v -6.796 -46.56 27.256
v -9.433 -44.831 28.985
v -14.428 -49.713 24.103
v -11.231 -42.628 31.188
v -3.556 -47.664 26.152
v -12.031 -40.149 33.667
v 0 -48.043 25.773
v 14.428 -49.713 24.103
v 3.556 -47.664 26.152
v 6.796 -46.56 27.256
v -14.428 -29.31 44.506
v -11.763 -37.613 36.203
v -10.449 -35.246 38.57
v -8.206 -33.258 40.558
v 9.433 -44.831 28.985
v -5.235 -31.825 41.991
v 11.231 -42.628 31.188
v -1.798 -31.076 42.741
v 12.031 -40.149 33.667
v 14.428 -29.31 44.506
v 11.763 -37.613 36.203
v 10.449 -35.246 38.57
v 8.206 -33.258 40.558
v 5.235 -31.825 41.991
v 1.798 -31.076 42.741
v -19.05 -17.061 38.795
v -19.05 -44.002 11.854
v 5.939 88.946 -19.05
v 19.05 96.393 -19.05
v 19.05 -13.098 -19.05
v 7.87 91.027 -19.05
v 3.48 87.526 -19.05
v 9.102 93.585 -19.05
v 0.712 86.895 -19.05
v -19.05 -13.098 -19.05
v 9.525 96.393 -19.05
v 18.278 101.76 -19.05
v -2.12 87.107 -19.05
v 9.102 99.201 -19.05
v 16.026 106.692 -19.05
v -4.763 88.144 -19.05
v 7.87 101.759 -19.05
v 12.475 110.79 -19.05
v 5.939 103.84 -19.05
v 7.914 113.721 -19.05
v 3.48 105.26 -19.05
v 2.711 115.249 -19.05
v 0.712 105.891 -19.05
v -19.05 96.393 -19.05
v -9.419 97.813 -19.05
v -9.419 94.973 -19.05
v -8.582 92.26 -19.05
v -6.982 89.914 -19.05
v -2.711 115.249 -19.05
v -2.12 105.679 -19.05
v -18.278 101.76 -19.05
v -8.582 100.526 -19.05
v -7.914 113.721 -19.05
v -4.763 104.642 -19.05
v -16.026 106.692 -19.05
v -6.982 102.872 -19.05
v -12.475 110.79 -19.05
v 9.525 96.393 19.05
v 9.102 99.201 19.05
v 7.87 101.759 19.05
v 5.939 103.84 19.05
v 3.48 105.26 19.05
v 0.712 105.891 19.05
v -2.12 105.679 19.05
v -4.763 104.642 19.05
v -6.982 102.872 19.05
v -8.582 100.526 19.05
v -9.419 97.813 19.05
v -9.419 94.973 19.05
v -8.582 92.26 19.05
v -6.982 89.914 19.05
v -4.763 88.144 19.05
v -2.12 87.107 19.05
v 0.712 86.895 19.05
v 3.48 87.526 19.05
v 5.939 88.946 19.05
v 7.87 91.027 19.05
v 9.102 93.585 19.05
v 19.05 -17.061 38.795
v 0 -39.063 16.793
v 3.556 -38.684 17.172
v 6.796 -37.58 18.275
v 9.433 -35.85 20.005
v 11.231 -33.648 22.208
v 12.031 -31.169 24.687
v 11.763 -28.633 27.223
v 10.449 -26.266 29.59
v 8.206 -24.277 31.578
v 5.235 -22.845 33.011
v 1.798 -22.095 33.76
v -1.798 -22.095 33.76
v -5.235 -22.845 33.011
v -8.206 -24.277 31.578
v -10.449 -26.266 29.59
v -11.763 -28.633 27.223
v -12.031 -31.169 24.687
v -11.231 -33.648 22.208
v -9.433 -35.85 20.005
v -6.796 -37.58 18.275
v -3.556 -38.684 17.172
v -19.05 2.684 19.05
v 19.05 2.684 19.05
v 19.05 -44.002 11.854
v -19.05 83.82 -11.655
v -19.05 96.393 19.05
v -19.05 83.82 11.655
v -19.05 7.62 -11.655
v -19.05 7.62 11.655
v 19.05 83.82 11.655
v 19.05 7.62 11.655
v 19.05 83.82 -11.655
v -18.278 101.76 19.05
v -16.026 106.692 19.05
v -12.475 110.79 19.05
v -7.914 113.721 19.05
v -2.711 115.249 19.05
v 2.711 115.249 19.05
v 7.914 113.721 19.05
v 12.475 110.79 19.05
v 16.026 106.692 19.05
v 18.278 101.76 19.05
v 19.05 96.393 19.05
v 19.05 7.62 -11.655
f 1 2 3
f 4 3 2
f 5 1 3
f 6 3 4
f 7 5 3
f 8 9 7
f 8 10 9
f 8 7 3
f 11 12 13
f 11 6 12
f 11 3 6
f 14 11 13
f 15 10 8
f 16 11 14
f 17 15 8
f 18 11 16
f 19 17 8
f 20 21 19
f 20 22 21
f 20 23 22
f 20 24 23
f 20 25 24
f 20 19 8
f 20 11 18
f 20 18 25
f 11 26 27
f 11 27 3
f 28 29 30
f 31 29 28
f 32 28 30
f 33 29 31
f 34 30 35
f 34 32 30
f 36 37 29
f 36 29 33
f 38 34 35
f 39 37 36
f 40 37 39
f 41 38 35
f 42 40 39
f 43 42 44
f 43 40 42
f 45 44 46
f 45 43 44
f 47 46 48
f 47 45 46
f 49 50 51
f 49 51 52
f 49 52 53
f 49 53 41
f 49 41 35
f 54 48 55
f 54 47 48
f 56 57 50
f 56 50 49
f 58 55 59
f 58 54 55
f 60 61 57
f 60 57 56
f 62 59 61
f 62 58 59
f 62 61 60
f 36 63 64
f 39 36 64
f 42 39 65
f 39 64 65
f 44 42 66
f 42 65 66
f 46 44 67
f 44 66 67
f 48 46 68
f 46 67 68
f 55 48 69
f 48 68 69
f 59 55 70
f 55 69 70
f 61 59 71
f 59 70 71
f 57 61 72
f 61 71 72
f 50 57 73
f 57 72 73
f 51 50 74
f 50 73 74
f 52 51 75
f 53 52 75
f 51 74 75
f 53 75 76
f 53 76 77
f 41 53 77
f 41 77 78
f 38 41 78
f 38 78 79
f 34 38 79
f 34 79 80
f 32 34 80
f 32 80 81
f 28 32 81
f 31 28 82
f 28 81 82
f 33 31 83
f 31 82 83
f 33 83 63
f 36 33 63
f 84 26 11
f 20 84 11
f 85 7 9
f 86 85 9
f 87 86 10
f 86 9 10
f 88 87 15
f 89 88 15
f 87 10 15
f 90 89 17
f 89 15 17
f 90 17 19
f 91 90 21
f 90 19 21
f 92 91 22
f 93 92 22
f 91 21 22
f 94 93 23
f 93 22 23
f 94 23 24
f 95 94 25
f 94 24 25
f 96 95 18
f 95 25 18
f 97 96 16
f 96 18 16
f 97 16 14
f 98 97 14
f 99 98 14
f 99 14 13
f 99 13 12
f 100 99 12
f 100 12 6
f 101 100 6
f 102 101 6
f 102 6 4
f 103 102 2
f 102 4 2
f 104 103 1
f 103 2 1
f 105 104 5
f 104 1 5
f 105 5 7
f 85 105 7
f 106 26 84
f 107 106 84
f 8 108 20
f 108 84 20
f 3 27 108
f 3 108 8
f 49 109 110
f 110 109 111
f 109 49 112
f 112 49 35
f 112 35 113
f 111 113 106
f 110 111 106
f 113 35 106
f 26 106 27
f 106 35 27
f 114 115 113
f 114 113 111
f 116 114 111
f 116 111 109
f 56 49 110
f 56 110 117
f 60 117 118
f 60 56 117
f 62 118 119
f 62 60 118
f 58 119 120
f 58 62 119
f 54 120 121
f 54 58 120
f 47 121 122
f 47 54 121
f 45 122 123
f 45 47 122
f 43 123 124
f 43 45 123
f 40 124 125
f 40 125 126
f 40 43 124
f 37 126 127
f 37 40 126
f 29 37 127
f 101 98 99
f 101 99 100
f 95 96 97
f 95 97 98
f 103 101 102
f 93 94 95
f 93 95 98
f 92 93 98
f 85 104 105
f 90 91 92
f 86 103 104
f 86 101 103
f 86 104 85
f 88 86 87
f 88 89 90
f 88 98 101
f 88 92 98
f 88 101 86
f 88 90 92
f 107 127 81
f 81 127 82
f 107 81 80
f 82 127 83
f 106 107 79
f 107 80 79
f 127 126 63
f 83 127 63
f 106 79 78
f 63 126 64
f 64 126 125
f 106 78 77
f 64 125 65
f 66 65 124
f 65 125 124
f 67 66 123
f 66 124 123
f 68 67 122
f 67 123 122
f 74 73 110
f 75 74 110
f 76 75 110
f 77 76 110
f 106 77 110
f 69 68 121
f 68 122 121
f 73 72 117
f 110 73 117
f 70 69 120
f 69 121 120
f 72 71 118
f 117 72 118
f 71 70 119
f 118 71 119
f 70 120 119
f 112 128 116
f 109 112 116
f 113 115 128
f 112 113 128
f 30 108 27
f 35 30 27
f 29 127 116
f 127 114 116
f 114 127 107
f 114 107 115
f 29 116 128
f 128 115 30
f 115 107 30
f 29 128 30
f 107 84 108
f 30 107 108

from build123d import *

# Parameters (mm, degrees)
SKETCH11_W          = 38.1
SKETCH11_H          = 38.1
SKETCH12_W          = 38.1
SKETCH12_H          = 38.1
BOSS_EXTRUDE5_DEPTH = 12.7
BOSS_EXTRUDE5_TAPER = 20
BOSS_EXTRUDE6_DEPTH = 38.1
SKETCH14_R          = 9.525
CUT_EXTRUDE2_DEPTH  = 38.1
SKETCH15_R          = 12.065
CUT_EXTRUDE3_DEPTH  = 12.7
SKETCH16_W          = 23.310601064
SKETCH16_H          = 76.2
CUT_EXTRUDE4_DEPTH  = 59.830675793


with BuildPart() as part:
    # Sweep1: sweep along a path in Sketch10
    with BuildLine(Plane(origin=(0, 0, 0), x_dir=(0, 0, -1), z_dir=(1, 0, 0))) as sweep1_path:
        Line((0, 96.393), (0, -5.207))
        Line((0, -5.207), (-25.324322261, -30.531322261))
    # Sketch11 → Sweep1 (sweep)
    with BuildSketch(Plane(origin=(0, 96.393, 0), x_dir=(1, 0, 0), z_dir=(0, 1, 0))):
        Rectangle(SKETCH11_W, SKETCH11_H)
    sweep(path=sweep1_path.line, transition=Transition.RIGHT)

    # Sketch12 → Boss-Extrude5 (add)
    with BuildSketch(Plane(origin=(0, -27.927822261, 27.927822261), x_dir=(1, 0, 0), z_dir=(0, -0.7071067811865461, 0.7071067811865489))):
        with Locations((0, -3.68190501)):
            Rectangle(SKETCH12_W, SKETCH12_H)
    extrude(amount=BOSS_EXTRUDE5_DEPTH, taper=BOSS_EXTRUDE5_TAPER)

    # Sketch13 → Boss-Extrude6 (add)
    with BuildSketch(Plane(origin=(0, 0, -19.05), x_dir=(-1, 0, 0), z_dir=(0, 0, -1))):
        with BuildLine():
            Line((-19.05, 96.393), (19.05, 96.393))
            ThreePointArc((19.05, 96.393), (0, 115.443), (-19.05, 96.393))
        make_face()
    extrude(amount=-BOSS_EXTRUDE6_DEPTH)

    # Sketch14 → Cut-Extrude2 (cut)
    with BuildSketch(Plane.XY.offset(19.05)):
        with Locations((0, 96.393)):
            Circle(SKETCH14_R)
    extrude(amount=-CUT_EXTRUDE2_DEPTH, mode=Mode.SUBTRACT)

    # Sketch15 → Cut-Extrude3 (cut)
    with BuildSketch(Plane(origin=(0, -36.908078382, 36.908078382), x_dir=(1, 0, 0), z_dir=(0, -0.7071067811865461, 0.7071067811865489))):
        with Locations(Location((0, -3.68190501, 0), (0, 0, 270))):
            Circle(SKETCH15_R)
    extrude(amount=-CUT_EXTRUDE3_DEPTH, mode=Mode.SUBTRACT)

    # Sketch16 → Cut-Extrude4 (cut)
    with BuildSketch(Plane(origin=(19.05, 0, 0), x_dir=(0, 0, -1), z_dir=(1, 0, 0))):
        with Locations((0, 45.72)):
            Rectangle(SKETCH16_W, SKETCH16_H)
    extrude(amount=-CUT_EXTRUDE4_DEPTH, mode=Mode.SUBTRACT)


solid = part.part
